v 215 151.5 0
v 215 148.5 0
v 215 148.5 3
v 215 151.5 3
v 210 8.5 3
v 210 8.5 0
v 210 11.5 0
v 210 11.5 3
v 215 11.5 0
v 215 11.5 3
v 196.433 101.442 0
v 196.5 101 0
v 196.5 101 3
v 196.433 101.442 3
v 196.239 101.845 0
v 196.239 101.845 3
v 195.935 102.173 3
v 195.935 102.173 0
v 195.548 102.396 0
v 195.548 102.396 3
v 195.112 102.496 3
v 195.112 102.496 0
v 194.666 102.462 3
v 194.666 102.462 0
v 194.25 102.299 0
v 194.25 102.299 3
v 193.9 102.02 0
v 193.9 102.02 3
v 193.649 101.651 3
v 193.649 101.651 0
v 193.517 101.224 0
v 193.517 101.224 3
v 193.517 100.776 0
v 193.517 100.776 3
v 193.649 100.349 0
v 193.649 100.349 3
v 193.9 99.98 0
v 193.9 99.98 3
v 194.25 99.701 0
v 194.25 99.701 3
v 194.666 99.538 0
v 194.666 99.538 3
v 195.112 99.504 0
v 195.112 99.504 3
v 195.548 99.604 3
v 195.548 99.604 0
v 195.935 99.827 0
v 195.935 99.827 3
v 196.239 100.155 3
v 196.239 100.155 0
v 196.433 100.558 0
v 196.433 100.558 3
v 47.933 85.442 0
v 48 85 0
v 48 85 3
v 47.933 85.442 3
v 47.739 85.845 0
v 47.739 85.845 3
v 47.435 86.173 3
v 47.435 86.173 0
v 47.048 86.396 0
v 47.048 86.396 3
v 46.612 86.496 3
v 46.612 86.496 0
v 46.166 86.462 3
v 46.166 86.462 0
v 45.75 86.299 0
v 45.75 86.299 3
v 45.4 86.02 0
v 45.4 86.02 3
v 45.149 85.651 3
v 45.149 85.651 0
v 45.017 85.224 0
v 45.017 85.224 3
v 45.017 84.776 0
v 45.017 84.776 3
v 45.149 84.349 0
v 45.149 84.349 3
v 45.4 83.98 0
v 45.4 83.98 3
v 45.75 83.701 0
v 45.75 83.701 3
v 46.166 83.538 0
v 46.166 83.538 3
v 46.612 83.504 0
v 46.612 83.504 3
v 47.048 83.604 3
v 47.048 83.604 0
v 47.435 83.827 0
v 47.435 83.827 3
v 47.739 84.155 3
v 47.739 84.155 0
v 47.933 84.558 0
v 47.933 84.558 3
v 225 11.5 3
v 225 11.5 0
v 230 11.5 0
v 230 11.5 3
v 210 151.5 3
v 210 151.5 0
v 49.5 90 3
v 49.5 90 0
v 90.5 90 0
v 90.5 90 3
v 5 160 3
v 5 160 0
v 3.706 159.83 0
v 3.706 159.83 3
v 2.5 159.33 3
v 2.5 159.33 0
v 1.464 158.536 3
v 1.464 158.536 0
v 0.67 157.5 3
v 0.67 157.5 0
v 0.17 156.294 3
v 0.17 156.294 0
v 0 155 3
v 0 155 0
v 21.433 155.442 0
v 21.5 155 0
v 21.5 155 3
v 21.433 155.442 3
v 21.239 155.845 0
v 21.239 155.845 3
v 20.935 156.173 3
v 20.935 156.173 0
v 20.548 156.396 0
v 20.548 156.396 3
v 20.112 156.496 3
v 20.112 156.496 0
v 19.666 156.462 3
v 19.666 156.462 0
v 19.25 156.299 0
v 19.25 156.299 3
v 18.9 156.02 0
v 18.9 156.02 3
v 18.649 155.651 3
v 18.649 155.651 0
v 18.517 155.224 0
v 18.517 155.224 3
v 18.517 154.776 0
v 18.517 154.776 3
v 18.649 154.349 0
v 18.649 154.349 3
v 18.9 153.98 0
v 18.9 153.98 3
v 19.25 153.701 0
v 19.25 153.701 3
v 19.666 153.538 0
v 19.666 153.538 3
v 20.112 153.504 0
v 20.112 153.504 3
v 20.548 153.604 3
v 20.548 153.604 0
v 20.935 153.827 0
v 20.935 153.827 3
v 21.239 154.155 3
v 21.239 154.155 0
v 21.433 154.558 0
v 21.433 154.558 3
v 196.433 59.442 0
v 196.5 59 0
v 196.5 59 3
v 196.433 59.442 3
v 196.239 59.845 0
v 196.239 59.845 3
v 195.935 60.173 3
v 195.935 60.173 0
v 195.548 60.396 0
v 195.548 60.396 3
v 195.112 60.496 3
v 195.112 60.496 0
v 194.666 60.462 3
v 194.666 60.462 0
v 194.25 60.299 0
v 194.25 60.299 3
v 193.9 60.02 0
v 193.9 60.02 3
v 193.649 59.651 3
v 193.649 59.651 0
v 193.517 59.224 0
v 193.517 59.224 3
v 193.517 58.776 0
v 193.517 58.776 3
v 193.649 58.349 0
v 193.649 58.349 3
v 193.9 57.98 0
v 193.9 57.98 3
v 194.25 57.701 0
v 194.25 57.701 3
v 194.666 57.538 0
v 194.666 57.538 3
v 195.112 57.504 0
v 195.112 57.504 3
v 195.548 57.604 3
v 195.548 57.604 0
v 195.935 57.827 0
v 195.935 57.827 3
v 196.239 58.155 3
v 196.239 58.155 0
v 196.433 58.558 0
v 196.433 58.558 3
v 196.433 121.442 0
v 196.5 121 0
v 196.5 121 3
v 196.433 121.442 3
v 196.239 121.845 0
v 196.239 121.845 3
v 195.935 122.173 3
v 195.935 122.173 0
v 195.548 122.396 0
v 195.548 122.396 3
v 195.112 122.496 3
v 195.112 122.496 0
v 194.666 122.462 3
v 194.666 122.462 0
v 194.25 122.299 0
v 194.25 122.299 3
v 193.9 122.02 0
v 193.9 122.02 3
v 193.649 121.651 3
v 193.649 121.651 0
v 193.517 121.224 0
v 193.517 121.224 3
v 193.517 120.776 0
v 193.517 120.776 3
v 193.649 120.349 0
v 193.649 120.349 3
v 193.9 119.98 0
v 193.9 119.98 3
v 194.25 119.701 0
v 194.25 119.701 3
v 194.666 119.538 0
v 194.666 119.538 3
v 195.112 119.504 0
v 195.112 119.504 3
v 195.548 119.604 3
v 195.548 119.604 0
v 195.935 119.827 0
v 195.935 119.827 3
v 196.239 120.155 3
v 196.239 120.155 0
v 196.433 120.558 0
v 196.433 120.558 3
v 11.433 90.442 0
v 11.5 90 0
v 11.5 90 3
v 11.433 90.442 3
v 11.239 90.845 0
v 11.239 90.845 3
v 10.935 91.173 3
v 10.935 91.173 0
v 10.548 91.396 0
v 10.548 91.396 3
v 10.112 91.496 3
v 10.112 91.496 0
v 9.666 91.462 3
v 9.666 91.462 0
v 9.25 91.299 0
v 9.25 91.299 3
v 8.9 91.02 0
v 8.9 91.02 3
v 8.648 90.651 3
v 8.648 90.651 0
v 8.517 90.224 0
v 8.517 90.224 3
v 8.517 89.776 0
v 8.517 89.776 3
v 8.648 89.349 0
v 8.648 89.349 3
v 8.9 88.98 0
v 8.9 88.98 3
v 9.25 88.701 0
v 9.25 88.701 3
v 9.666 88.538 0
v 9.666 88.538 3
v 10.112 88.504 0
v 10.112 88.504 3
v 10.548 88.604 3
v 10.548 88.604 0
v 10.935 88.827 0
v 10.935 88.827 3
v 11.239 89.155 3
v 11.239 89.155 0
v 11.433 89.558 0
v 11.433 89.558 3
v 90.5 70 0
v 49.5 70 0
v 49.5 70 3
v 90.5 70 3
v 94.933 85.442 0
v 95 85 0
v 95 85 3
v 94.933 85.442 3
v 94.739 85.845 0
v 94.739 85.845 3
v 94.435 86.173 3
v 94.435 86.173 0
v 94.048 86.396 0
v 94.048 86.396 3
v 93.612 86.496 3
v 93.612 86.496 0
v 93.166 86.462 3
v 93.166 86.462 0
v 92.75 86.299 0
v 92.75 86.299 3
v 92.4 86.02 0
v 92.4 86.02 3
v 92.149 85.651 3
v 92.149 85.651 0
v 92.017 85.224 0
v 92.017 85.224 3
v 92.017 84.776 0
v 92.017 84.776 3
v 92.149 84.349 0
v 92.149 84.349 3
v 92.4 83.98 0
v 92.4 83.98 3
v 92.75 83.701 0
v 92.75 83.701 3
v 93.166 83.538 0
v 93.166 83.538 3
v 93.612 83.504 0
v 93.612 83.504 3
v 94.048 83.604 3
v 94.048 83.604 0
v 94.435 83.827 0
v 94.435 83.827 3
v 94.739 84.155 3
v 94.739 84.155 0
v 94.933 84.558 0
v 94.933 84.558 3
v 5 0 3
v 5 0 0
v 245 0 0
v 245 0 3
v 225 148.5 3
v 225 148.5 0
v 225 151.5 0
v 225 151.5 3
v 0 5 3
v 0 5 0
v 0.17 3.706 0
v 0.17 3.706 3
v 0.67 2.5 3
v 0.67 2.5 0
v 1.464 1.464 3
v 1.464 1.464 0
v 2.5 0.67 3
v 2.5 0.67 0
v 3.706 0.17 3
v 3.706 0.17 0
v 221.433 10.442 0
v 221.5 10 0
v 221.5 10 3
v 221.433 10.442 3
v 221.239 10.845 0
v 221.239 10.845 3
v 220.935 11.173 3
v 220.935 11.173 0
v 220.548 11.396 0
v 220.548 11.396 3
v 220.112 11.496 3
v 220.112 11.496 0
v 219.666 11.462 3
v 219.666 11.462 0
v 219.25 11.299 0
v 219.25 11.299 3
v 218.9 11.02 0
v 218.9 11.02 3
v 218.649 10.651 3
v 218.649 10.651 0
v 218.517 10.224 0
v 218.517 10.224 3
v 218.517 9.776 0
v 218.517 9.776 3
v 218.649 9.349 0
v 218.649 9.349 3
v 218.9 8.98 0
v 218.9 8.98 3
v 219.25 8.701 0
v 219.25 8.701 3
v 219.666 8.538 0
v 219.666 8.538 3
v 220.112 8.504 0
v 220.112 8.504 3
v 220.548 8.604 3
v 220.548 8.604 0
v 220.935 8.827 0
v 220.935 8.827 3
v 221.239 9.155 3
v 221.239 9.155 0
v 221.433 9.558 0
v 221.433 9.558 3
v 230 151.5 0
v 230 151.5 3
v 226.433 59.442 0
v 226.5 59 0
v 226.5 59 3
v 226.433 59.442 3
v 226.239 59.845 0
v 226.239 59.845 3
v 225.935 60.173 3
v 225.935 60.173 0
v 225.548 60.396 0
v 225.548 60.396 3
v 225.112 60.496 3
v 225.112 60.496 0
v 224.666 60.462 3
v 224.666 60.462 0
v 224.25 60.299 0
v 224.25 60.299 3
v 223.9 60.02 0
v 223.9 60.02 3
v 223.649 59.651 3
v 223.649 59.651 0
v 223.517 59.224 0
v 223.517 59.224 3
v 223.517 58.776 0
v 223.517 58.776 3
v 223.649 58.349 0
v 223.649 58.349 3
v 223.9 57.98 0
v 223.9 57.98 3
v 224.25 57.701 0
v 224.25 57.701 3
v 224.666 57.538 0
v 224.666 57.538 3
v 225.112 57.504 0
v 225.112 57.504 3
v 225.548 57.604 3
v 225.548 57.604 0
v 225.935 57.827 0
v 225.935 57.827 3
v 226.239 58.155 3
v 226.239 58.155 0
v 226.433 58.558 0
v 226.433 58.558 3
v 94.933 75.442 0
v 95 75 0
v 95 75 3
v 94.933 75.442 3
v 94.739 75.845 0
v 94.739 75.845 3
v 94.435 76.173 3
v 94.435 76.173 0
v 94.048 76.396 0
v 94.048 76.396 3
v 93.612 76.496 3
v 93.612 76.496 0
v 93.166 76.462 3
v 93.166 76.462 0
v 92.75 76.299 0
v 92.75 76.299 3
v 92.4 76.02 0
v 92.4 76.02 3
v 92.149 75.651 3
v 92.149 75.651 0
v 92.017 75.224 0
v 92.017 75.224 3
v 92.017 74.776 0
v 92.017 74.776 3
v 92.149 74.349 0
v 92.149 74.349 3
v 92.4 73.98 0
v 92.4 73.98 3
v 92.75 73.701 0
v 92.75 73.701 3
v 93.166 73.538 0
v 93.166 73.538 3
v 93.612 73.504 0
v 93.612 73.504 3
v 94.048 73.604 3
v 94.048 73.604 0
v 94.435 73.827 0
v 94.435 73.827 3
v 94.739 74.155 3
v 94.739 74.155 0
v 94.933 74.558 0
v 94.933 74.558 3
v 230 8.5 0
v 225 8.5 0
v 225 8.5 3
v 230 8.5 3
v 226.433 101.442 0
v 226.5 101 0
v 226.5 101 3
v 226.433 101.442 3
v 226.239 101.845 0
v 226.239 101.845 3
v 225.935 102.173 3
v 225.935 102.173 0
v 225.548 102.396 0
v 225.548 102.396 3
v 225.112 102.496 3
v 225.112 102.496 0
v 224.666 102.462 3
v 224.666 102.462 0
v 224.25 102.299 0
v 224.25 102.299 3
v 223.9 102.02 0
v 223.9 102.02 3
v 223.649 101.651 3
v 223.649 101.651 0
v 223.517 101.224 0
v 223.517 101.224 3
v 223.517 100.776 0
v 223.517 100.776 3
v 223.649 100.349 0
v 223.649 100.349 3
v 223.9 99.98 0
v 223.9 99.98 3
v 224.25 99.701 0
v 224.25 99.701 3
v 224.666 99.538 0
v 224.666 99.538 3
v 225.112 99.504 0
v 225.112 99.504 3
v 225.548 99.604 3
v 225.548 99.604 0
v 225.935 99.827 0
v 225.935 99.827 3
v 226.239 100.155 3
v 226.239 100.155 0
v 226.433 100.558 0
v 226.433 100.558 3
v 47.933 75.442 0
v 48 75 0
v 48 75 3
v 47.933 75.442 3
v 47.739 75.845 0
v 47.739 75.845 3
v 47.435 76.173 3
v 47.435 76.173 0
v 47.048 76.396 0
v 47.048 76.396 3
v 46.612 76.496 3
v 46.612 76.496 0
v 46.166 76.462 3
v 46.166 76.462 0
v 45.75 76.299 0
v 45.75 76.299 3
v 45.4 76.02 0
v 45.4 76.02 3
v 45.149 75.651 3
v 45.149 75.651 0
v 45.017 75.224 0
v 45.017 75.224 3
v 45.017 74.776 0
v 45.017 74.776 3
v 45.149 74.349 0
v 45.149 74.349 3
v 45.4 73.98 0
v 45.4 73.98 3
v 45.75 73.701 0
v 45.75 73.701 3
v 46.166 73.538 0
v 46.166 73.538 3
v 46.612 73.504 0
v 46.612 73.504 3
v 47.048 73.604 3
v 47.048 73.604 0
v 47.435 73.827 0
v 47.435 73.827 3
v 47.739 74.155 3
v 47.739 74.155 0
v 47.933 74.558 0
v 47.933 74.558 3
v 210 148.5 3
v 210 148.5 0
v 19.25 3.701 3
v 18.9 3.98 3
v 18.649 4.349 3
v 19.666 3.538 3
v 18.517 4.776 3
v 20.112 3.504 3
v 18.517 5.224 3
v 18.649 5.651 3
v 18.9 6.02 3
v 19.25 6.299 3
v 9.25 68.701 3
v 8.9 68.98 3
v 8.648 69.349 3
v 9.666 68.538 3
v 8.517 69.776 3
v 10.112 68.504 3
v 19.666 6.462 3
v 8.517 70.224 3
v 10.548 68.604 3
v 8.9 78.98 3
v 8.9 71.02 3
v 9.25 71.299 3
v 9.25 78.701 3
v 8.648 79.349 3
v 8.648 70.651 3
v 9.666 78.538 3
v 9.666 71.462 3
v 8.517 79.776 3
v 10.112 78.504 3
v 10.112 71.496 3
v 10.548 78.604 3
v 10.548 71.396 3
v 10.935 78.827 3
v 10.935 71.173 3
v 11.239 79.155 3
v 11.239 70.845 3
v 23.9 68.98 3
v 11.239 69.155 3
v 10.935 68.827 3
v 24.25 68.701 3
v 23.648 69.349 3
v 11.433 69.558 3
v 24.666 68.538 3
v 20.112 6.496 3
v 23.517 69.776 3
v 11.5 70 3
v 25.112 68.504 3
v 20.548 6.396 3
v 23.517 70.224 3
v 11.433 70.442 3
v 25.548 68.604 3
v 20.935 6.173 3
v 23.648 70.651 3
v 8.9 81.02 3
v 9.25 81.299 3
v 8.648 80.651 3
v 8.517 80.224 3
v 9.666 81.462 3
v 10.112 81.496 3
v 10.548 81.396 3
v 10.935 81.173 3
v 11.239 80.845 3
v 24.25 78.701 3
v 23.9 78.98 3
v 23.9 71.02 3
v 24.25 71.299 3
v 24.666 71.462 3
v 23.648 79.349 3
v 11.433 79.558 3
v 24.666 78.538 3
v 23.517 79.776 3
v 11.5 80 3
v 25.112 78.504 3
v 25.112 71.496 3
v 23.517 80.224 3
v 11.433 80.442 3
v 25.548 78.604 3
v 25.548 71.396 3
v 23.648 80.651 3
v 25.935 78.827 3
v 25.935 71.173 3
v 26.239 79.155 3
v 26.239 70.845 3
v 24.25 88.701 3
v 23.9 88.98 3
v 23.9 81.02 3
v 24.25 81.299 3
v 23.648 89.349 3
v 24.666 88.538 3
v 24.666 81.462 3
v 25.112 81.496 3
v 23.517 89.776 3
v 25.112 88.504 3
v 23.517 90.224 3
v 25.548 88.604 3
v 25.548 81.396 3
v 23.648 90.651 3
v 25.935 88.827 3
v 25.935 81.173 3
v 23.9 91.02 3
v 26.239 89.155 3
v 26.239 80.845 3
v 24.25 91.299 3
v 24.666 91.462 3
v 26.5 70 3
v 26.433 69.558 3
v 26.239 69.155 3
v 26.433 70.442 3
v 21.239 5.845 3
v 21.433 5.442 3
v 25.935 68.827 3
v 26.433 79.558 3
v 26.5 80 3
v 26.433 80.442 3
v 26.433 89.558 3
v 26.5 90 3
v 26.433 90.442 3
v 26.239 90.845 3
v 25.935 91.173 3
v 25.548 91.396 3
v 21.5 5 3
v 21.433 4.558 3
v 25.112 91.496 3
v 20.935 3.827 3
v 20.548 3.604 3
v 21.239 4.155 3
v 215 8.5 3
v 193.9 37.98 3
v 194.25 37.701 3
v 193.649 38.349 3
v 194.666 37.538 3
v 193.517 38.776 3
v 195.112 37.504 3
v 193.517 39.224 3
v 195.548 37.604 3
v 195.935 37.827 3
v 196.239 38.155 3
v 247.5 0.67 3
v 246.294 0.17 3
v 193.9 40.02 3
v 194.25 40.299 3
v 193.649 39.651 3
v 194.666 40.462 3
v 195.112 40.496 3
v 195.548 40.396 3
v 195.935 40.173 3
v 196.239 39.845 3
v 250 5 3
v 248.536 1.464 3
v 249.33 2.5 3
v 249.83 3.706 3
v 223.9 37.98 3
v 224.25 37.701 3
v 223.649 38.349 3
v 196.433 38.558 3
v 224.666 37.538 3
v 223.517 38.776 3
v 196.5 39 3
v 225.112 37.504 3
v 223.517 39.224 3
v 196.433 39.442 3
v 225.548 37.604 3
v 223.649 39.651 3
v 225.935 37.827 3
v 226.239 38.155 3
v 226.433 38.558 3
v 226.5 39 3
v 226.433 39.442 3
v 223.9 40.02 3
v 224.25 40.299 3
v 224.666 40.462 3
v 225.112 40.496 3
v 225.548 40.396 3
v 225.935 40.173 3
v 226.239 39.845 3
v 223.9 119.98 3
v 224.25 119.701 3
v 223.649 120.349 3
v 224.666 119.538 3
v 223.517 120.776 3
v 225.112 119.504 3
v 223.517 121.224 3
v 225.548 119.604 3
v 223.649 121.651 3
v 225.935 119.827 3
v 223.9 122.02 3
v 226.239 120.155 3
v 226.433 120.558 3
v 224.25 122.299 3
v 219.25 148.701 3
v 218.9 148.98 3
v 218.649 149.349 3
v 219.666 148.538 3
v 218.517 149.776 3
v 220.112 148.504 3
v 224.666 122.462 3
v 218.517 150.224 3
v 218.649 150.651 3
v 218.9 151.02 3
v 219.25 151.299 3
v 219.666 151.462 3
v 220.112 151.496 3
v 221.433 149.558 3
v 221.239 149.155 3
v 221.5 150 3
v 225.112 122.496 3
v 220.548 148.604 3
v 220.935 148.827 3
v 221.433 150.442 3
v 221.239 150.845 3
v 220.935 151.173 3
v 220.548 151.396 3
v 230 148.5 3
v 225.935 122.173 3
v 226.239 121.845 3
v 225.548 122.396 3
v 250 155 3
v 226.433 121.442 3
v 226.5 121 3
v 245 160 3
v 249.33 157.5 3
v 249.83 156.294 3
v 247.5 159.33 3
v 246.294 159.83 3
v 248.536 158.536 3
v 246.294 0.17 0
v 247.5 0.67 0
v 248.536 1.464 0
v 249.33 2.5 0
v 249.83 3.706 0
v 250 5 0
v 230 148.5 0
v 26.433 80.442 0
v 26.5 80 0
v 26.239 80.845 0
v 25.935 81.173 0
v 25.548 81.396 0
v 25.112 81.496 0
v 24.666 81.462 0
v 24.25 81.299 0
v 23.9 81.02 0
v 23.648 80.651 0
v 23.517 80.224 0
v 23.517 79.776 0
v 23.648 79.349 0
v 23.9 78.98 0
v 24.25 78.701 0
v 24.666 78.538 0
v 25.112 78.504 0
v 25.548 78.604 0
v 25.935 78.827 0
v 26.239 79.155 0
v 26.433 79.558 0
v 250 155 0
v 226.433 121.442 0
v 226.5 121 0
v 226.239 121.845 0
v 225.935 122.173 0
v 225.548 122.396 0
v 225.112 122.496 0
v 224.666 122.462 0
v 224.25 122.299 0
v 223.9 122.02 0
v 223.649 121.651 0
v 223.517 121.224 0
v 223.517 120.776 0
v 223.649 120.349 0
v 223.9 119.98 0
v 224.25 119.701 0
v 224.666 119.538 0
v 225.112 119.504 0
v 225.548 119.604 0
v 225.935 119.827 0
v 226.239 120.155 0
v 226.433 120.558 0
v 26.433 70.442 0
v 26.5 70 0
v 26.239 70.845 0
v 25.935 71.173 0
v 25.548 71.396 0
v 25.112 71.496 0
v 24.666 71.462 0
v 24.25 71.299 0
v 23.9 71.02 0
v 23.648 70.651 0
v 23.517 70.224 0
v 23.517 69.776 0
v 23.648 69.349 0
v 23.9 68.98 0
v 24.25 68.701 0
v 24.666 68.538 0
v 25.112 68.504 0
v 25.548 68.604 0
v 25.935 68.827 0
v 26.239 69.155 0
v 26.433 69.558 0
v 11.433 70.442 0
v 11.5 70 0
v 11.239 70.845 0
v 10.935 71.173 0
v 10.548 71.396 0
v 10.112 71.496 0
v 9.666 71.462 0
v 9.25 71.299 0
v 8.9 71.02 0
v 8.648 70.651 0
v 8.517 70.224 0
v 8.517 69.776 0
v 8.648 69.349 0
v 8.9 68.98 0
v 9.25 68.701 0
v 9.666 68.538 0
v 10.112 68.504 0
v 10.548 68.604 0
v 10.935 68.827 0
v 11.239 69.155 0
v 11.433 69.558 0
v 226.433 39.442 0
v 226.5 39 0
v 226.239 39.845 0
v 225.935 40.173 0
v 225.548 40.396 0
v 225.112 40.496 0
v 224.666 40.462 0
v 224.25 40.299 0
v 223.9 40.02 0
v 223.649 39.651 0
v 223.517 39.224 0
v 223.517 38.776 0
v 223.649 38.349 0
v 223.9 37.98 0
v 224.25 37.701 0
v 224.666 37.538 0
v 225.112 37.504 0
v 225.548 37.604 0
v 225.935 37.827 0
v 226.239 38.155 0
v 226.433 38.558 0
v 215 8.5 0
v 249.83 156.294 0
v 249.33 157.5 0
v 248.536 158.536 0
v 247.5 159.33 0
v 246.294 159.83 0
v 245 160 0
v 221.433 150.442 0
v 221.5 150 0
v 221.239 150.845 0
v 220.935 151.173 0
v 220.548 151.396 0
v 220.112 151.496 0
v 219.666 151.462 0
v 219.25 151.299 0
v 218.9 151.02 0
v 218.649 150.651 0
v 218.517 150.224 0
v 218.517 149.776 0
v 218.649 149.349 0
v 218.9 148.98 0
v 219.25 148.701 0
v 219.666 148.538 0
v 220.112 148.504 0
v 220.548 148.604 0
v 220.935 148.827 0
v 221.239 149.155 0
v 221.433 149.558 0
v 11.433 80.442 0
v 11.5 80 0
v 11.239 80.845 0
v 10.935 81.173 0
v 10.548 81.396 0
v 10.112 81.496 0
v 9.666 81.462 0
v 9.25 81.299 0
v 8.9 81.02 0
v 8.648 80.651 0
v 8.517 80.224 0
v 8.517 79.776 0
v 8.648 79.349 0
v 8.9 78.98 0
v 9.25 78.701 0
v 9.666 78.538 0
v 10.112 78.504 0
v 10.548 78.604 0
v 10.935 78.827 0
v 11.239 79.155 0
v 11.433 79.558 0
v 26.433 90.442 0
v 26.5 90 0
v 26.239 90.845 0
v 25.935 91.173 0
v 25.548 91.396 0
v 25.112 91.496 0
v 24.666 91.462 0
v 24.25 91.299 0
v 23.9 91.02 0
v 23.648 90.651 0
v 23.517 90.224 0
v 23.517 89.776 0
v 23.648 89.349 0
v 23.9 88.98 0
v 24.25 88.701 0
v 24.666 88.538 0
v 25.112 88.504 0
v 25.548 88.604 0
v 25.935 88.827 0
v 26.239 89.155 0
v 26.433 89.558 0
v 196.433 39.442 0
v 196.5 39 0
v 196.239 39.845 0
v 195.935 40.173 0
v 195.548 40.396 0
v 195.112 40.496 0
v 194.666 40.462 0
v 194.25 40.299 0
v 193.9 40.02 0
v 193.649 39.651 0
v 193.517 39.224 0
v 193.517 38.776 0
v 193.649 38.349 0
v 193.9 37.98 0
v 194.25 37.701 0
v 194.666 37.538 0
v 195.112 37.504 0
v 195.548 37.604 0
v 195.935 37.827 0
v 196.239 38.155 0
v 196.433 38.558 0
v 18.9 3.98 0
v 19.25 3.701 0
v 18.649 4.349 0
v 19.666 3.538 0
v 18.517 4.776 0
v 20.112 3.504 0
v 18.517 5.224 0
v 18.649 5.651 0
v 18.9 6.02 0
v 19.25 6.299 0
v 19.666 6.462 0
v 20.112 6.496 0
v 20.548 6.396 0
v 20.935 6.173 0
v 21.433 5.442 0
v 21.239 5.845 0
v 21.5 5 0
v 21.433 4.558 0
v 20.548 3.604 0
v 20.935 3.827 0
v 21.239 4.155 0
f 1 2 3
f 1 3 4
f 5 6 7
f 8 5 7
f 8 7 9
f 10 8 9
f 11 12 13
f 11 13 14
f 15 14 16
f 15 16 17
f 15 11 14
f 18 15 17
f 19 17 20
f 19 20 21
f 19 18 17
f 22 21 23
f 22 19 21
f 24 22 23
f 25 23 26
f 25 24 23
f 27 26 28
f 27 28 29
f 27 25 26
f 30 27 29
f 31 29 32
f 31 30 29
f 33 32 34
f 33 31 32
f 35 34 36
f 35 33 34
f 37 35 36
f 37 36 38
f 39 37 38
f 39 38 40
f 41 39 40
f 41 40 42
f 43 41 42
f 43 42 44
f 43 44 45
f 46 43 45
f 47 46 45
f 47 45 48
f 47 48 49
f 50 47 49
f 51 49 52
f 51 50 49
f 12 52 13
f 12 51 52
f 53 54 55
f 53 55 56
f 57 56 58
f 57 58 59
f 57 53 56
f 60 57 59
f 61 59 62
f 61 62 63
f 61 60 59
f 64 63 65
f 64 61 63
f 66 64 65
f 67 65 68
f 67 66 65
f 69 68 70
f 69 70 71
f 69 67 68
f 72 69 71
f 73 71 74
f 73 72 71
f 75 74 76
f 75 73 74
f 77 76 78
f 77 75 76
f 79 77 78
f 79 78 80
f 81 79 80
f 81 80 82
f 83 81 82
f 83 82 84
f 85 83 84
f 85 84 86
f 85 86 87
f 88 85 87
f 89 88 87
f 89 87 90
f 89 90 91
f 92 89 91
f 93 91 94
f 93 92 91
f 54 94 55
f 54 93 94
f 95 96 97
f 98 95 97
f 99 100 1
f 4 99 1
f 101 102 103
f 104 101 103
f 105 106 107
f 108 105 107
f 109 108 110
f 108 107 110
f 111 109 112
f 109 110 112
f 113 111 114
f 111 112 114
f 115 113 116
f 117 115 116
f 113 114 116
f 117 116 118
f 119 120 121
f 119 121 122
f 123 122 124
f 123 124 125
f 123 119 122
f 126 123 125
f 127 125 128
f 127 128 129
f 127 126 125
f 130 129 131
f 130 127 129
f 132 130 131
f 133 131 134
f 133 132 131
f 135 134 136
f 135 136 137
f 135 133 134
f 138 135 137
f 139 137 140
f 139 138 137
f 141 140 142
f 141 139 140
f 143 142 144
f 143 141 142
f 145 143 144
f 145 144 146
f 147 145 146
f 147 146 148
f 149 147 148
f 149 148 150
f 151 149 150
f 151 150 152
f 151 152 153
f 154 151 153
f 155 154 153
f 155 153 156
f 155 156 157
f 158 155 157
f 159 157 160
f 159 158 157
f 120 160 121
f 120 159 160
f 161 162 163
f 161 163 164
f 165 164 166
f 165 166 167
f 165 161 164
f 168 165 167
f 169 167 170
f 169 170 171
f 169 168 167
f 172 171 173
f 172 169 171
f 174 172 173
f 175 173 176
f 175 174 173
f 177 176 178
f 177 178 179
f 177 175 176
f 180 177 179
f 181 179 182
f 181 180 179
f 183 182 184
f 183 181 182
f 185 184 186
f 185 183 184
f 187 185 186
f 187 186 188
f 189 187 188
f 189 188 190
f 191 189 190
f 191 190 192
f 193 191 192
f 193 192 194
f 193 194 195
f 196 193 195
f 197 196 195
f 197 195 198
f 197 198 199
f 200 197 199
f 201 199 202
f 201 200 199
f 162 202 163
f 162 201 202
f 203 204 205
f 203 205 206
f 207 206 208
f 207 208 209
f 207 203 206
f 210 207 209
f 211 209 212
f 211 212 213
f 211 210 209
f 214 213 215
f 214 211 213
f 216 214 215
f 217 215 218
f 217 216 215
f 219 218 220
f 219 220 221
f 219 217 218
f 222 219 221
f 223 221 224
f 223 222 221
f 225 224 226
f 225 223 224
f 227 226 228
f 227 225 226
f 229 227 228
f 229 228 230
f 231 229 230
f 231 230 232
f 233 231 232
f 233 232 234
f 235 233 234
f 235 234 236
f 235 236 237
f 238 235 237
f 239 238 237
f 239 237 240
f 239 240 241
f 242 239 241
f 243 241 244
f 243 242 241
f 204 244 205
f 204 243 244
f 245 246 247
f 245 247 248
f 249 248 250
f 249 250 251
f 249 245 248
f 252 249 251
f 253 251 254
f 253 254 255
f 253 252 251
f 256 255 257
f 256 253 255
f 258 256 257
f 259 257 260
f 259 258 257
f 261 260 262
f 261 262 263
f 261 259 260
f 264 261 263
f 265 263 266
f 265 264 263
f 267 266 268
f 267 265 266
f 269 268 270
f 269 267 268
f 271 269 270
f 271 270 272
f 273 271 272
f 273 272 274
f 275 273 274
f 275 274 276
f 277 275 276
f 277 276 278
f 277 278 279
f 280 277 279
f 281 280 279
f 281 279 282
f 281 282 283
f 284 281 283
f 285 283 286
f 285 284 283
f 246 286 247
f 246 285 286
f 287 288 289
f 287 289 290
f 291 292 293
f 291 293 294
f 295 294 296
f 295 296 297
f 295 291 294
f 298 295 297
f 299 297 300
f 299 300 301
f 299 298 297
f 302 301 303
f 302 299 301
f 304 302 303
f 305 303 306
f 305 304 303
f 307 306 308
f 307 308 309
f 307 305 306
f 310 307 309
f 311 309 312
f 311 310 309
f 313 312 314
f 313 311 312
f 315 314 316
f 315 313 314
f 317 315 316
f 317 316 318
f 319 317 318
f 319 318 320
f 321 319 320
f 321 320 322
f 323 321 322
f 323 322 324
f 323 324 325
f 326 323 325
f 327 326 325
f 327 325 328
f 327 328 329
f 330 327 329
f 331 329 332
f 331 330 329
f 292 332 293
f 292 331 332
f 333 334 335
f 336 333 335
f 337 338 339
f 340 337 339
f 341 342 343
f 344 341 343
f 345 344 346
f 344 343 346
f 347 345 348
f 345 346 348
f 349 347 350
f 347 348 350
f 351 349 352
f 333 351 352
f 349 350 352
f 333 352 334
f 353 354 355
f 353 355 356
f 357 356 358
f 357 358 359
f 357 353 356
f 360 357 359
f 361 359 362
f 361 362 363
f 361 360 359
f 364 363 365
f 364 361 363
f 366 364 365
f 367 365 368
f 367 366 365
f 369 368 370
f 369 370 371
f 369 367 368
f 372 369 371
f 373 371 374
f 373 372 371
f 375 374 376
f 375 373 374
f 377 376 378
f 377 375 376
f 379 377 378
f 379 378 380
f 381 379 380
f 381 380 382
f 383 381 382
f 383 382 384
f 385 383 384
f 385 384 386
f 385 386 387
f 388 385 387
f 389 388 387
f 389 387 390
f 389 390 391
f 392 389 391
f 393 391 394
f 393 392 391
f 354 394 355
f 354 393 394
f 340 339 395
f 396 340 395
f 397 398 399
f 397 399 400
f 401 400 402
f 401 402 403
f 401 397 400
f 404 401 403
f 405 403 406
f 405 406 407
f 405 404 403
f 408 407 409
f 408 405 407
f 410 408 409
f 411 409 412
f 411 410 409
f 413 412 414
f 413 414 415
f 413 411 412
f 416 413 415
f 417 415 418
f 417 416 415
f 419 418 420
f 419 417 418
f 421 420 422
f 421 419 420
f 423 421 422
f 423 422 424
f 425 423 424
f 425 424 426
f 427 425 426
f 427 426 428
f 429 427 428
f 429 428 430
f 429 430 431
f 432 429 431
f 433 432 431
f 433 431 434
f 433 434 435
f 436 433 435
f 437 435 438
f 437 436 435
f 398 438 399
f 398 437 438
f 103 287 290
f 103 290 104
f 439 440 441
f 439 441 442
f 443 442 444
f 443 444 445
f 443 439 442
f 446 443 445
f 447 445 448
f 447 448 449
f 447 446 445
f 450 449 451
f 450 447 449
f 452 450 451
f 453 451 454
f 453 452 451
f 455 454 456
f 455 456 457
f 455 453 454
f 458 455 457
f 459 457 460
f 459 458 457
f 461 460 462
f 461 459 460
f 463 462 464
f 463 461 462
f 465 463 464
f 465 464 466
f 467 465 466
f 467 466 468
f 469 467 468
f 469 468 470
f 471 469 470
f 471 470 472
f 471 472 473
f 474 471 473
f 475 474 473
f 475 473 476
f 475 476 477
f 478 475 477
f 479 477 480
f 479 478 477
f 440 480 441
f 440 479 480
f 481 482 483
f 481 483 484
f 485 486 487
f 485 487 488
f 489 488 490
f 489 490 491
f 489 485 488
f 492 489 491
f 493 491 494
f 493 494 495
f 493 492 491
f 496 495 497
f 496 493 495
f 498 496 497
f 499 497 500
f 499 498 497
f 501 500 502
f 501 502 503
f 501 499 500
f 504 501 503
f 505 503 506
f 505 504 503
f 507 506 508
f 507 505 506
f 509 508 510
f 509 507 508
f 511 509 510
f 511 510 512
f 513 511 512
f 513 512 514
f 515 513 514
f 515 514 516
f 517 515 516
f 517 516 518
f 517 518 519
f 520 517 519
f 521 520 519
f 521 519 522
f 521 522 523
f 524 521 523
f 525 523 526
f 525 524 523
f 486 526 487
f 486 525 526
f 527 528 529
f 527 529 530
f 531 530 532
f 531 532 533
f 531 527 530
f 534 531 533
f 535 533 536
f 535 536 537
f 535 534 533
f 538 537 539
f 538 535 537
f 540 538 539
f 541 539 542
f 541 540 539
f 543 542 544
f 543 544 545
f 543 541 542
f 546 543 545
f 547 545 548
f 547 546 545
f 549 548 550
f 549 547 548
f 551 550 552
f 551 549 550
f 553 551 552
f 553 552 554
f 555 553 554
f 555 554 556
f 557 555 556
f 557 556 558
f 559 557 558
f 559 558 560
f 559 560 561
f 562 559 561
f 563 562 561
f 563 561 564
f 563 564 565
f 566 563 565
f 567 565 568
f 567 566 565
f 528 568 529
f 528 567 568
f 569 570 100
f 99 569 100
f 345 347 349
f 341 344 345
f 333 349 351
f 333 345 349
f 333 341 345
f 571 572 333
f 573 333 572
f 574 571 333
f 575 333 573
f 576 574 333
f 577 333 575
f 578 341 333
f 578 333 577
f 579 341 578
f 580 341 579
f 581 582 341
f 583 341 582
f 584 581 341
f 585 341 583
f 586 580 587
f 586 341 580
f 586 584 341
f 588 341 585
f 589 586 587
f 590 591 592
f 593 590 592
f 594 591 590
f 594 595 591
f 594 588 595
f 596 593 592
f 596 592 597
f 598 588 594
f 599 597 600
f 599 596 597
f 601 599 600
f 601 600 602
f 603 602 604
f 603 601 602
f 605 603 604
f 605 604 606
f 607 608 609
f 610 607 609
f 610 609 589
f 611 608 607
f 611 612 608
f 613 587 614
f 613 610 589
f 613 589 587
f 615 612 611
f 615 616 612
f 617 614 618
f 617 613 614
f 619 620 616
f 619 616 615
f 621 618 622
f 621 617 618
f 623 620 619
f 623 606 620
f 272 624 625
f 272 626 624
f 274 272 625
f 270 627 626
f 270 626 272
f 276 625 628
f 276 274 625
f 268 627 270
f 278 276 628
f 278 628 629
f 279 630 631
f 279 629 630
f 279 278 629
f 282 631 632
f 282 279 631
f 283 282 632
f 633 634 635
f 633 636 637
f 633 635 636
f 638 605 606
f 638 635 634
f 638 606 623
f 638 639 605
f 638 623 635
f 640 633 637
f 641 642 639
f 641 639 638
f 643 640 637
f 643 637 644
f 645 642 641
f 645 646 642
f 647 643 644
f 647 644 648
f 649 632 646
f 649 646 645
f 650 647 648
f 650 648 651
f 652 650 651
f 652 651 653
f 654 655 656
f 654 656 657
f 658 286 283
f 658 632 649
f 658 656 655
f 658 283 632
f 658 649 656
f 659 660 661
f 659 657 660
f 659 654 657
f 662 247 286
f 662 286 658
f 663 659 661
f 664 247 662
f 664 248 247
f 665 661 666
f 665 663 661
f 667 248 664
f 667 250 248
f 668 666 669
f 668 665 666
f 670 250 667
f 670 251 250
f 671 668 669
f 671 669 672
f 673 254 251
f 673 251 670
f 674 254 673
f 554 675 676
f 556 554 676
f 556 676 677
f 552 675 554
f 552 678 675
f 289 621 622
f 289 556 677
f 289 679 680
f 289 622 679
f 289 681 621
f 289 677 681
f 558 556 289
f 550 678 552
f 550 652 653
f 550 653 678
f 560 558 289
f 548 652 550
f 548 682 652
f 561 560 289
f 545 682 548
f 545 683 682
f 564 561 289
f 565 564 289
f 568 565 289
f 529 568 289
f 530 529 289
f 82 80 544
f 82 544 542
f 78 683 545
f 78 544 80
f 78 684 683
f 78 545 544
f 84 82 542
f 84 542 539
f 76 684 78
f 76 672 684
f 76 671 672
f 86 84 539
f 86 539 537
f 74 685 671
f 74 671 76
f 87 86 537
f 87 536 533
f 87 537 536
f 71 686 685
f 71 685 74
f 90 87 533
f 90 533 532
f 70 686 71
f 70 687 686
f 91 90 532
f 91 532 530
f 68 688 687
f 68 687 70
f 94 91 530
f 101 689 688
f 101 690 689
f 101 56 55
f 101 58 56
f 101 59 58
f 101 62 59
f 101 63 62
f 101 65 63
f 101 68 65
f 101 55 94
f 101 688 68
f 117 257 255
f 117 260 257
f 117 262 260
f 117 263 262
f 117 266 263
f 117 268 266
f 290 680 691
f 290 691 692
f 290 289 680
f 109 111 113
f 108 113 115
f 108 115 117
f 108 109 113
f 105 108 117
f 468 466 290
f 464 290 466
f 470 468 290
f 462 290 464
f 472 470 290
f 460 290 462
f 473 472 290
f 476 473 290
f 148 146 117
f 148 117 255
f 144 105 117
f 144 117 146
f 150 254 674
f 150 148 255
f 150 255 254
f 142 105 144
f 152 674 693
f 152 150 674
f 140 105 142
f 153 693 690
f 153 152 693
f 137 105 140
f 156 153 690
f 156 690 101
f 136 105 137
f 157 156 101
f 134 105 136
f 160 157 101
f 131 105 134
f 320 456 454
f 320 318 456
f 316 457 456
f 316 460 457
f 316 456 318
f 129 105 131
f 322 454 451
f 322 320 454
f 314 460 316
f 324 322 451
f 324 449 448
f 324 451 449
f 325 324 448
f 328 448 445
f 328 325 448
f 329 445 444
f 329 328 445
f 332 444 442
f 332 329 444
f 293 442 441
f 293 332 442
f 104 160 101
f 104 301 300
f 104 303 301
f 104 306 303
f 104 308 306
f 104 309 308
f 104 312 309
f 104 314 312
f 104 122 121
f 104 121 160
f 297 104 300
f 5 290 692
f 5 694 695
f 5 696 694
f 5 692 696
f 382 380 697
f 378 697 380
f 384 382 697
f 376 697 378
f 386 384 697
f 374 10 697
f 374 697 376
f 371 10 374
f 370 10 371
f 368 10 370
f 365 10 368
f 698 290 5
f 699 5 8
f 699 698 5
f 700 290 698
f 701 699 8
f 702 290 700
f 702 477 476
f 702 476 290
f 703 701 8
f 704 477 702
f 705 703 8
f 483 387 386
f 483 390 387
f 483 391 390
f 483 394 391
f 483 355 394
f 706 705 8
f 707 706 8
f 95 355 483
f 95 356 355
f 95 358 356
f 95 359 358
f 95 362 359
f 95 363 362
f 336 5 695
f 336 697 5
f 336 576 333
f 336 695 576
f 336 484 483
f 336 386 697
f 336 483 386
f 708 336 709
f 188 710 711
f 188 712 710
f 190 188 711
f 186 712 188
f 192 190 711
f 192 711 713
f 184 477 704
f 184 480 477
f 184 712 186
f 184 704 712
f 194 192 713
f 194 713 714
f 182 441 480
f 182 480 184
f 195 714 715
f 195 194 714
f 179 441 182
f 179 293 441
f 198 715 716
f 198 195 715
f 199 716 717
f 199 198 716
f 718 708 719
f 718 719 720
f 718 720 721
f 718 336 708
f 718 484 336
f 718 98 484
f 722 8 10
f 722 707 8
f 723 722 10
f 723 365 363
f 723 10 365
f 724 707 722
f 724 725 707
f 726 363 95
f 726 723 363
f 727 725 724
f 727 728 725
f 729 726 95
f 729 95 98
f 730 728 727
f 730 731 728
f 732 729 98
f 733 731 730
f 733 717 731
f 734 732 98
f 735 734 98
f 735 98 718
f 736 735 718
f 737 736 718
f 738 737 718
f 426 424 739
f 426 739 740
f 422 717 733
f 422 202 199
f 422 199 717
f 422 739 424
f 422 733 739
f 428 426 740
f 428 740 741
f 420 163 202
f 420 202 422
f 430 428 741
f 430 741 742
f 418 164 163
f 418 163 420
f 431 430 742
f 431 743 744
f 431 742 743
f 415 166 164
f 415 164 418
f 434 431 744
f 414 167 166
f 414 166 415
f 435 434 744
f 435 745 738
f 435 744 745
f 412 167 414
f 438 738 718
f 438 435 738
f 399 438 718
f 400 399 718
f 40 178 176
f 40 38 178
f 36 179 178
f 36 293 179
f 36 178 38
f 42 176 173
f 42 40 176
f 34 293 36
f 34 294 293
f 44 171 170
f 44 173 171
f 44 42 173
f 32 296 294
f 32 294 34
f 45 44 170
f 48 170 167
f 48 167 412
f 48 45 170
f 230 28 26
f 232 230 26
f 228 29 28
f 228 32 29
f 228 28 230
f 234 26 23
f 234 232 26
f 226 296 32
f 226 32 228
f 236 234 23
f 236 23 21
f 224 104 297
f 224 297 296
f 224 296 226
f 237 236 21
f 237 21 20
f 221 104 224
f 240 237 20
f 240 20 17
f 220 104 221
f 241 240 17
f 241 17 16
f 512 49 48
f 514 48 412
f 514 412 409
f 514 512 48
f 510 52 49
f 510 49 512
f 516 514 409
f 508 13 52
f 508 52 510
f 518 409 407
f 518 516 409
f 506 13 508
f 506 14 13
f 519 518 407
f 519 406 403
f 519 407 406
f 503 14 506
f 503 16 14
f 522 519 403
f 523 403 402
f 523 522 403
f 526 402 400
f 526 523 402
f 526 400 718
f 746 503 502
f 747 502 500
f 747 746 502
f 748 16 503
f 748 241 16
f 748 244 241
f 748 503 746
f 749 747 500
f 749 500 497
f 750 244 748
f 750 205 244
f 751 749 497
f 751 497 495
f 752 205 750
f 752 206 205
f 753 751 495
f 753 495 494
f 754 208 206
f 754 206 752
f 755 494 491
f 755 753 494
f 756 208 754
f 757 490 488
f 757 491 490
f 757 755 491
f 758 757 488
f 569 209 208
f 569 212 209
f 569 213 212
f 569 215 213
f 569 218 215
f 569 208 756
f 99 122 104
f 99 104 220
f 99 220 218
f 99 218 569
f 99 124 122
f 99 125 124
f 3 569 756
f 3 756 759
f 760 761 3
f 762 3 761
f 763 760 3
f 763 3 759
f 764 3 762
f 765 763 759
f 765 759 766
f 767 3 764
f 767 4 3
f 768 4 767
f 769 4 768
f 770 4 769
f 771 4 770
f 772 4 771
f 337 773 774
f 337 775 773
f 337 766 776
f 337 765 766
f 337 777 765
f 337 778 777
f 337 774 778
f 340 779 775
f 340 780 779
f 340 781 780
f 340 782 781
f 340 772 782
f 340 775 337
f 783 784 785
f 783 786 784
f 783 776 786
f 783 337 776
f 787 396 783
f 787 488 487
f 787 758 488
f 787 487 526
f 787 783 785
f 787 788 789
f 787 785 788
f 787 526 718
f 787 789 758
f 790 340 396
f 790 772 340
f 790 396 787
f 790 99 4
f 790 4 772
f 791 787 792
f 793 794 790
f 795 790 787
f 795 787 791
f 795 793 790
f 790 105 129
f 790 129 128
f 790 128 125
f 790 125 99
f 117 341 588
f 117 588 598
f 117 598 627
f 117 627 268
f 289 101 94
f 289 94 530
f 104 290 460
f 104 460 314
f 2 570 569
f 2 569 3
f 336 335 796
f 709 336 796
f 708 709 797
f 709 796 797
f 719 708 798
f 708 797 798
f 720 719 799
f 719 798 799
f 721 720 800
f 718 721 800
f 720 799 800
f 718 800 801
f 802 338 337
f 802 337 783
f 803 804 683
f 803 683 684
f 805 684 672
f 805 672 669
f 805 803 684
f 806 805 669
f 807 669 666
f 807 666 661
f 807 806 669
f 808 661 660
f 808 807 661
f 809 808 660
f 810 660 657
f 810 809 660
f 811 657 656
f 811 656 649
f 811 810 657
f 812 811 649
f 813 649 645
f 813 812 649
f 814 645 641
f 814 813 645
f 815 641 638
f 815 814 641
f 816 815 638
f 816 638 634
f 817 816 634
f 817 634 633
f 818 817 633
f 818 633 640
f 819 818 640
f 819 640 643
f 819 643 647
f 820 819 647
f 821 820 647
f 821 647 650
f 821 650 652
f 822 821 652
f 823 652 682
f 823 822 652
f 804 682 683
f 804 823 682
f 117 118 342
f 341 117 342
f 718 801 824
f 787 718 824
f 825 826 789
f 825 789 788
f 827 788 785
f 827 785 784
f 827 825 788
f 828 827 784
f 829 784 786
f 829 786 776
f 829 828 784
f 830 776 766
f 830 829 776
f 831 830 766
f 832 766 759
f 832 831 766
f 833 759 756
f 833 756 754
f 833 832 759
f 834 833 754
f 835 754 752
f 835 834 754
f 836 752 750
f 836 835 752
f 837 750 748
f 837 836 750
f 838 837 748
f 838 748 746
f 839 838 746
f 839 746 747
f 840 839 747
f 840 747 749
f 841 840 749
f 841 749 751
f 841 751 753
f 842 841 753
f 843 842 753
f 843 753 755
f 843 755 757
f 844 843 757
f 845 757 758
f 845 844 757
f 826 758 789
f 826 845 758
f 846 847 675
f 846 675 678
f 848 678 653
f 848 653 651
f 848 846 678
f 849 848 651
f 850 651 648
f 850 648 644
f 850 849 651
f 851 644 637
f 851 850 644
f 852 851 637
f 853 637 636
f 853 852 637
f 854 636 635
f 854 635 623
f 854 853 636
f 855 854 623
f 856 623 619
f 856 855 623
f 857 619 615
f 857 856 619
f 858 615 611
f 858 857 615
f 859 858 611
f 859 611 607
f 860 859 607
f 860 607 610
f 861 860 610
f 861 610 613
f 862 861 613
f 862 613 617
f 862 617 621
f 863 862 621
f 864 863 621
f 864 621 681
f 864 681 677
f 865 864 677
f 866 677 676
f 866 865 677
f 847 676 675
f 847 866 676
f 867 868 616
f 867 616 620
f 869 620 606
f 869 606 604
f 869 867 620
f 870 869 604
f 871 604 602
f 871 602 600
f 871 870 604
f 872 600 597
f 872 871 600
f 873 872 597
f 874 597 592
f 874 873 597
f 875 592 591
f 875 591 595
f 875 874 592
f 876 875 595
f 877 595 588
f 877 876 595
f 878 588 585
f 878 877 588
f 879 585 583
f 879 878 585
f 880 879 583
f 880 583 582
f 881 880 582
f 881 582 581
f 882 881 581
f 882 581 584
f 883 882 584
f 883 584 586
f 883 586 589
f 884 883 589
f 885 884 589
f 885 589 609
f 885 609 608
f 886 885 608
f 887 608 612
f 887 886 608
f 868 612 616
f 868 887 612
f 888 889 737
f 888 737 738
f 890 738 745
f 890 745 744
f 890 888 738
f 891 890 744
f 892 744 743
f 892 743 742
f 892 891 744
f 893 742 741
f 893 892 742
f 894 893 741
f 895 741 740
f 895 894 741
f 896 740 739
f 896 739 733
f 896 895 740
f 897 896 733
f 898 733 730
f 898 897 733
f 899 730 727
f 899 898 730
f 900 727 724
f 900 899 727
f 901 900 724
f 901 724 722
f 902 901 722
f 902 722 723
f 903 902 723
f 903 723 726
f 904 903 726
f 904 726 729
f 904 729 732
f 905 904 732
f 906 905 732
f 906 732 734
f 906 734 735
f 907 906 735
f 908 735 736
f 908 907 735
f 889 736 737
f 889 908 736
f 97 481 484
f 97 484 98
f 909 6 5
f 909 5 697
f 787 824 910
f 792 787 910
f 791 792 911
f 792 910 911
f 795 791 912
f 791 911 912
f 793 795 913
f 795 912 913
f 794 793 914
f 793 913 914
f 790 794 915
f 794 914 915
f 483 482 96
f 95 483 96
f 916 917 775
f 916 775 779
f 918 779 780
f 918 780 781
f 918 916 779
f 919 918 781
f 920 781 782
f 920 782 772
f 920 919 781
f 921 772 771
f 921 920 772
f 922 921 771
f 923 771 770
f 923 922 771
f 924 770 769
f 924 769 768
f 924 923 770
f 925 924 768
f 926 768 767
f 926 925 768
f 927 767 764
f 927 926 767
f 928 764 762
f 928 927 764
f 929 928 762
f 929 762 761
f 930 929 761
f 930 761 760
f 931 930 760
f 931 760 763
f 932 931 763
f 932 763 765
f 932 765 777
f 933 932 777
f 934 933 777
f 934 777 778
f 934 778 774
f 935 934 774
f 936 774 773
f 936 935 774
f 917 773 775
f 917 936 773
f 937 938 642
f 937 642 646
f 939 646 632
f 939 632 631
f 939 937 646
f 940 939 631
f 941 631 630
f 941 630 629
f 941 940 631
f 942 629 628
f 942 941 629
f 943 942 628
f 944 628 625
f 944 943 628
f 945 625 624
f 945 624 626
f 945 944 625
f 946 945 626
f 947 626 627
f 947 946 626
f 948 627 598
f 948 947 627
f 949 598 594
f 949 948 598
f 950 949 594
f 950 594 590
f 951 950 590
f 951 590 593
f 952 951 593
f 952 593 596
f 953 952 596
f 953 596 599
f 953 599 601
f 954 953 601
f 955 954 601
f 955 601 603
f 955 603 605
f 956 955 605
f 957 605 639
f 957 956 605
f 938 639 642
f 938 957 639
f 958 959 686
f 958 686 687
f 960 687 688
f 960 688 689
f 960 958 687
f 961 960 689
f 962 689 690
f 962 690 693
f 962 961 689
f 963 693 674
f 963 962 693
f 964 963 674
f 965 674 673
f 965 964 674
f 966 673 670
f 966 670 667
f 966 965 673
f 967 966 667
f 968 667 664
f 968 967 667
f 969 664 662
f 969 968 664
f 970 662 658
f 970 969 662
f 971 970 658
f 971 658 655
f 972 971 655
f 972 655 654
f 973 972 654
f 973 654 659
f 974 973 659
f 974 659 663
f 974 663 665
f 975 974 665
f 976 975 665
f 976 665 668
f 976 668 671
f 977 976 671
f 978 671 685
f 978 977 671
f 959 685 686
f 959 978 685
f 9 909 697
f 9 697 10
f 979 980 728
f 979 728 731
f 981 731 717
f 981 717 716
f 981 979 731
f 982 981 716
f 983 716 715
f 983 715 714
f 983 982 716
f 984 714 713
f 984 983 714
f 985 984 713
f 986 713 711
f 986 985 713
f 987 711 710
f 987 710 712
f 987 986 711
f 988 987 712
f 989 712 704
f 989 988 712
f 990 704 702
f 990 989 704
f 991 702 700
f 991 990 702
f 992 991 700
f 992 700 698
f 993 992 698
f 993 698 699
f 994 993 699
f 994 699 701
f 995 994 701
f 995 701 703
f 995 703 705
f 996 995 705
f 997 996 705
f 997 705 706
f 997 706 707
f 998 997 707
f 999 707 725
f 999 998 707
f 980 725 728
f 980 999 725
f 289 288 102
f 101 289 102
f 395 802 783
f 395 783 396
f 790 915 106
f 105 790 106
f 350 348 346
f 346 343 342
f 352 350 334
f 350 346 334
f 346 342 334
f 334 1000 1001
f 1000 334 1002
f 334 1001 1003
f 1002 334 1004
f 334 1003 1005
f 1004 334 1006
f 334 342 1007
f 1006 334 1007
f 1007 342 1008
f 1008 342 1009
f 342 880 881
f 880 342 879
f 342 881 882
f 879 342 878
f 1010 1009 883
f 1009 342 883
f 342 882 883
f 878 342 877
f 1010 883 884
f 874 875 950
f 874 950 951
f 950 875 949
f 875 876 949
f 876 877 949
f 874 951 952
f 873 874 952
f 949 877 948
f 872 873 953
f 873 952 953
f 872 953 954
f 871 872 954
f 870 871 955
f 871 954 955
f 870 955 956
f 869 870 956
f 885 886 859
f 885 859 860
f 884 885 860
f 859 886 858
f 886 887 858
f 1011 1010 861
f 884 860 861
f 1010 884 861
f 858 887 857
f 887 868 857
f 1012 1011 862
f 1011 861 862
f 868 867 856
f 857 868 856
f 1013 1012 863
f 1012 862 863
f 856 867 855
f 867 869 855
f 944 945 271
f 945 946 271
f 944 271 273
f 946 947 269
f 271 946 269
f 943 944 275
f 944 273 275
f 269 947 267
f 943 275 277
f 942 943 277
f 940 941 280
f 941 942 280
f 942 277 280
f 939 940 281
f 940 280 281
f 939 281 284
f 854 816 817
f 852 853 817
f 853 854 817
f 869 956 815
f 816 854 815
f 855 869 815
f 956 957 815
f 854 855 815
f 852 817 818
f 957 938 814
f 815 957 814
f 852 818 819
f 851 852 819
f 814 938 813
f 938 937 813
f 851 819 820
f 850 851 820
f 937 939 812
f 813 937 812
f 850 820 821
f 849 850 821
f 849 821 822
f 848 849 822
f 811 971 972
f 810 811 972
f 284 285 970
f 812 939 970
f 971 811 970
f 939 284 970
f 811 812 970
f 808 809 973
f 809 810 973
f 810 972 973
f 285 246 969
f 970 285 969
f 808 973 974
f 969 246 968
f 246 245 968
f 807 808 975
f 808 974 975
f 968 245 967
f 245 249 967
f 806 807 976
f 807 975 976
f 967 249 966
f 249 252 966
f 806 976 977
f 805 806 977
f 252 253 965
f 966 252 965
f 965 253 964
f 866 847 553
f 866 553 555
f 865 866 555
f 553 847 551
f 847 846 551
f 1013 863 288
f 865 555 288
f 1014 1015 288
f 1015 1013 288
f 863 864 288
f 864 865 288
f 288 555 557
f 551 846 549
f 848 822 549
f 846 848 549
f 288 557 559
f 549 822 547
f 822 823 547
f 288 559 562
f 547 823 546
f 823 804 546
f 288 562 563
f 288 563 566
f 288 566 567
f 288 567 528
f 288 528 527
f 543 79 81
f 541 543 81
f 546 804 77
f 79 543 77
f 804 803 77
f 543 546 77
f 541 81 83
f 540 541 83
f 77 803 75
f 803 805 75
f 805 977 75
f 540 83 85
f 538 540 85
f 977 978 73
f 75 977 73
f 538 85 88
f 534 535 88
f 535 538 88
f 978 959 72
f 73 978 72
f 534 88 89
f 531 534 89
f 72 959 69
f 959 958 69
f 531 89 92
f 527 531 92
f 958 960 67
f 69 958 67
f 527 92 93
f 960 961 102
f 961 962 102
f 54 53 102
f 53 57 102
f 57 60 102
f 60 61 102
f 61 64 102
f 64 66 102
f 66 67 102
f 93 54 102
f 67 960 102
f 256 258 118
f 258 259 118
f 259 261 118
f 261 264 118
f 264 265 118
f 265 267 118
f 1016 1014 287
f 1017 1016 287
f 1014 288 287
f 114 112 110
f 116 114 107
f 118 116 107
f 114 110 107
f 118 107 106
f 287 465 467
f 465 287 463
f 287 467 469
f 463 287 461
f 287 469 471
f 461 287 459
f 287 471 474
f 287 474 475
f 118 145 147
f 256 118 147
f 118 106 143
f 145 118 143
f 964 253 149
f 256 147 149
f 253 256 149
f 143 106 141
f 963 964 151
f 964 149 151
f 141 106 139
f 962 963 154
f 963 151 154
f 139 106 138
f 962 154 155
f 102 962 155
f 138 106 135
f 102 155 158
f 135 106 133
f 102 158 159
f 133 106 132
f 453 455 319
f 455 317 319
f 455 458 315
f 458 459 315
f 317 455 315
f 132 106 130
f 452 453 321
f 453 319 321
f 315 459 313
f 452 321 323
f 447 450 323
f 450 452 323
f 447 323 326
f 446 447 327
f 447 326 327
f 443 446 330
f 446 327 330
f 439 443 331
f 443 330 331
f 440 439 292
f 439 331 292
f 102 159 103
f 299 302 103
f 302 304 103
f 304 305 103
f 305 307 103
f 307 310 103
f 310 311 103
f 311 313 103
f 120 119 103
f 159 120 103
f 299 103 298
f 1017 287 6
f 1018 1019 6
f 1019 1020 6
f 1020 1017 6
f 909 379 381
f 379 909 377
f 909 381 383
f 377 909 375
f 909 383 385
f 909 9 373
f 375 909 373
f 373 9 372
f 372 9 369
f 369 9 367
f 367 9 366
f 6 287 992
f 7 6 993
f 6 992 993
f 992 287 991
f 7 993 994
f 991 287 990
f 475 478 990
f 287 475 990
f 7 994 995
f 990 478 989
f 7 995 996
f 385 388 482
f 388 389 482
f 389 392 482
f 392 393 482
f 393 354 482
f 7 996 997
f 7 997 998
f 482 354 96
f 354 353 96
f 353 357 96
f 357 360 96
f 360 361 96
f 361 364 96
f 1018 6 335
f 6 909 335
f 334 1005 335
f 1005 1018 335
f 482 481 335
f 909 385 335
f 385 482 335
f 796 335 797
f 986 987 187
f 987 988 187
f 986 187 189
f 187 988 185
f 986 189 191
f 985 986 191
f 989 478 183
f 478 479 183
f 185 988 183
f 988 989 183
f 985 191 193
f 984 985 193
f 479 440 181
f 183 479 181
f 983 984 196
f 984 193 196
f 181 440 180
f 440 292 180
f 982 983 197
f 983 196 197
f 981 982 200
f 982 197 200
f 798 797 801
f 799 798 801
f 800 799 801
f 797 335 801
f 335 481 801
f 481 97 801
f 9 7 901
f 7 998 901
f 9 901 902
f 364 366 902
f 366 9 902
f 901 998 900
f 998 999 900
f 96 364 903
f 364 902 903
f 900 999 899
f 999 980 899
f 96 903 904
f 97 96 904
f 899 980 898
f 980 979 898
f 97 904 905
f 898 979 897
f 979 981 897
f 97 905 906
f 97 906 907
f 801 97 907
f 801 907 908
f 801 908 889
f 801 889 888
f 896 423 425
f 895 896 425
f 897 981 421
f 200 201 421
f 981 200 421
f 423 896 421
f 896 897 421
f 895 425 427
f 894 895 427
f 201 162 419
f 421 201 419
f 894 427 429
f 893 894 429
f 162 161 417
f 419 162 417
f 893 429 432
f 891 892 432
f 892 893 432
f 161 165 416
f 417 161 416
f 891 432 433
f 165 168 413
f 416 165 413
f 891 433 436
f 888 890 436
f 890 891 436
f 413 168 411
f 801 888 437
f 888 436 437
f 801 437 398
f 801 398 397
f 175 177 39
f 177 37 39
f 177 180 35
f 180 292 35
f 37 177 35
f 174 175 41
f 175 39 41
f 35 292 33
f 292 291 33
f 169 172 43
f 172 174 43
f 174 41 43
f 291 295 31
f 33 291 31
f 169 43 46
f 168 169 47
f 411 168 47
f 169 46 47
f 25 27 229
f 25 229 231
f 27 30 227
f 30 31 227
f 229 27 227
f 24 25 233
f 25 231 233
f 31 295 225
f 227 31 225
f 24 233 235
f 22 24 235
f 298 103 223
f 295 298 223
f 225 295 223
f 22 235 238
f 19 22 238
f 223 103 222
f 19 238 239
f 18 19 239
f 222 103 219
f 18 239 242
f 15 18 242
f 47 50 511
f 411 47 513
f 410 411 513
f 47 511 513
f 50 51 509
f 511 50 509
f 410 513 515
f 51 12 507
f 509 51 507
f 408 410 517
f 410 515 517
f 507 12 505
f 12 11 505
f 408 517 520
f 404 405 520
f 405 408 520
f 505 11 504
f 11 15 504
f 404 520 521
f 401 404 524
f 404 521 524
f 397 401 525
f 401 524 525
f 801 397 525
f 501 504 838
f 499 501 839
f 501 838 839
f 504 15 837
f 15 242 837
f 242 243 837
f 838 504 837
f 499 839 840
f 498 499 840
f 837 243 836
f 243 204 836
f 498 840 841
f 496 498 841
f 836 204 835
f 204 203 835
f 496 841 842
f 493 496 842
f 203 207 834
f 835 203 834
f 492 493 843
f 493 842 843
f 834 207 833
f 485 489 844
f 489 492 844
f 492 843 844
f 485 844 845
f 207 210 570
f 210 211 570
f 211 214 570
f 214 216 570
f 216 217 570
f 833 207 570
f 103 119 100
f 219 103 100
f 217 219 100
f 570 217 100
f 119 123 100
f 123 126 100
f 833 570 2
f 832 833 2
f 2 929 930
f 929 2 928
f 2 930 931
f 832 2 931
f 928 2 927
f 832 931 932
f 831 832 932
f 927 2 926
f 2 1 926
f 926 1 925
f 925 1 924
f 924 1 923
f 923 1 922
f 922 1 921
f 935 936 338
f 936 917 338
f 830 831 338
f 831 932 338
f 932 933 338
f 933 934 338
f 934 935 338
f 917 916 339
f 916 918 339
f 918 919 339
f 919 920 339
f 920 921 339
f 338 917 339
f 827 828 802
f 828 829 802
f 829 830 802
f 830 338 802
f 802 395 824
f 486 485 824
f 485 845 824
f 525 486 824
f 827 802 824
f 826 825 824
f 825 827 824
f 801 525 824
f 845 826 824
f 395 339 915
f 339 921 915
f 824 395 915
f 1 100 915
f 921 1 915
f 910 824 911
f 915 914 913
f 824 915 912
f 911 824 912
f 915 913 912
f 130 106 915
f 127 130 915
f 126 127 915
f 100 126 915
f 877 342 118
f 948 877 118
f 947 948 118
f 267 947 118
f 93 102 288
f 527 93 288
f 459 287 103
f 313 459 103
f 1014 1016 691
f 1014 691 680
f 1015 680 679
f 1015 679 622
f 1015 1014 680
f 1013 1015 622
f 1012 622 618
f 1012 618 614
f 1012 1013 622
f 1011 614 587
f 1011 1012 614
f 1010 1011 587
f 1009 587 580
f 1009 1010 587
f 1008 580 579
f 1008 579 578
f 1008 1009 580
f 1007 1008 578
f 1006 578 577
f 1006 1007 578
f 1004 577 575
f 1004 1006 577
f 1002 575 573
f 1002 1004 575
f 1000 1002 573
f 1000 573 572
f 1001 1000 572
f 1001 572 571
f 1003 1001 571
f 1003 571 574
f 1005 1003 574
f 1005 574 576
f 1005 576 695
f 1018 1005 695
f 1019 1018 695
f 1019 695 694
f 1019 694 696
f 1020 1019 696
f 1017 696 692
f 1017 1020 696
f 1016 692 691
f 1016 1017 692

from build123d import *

# Parameters (mm, degrees)
F0_R     = 1.5
F0_W     = 5
F0_H     = 3
F0_W_2   = 41
F0_H_2   = 20
F1_DEPTH = 3


with BuildPart() as f1:
    # F0 (on Top) → F1 (new body)
    with BuildSketch(Plane.XY):
        with BuildLine():
            Line((245, 160), (5, 160))
            ThreePointArc((5, 160), (1.4644660941, 158.5355339059), (0, 155))
            Line((0, 155), (0, 5))
            ThreePointArc((0, 5), (1.4644660941, 1.4644660941), (5, 0))
            Line((5, 0), (245, 0))
            ThreePointArc((245, 0), (248.5355339059, 1.4644660941), (250, 5))
            Line((250, 5), (250, 155))
            ThreePointArc((250, 155), (248.5355339059, 158.5355339059), (245, 160))
        make_face()
        with Locations((20, 5)):
            Circle(F0_R, mode=Mode.SUBTRACT)
        with Locations((212.5, 10)):
            Rectangle(F0_W, F0_H, mode=Mode.SUBTRACT)
        with Locations((220, 10)):
            Circle(F0_R, mode=Mode.SUBTRACT)
        with Locations((227.5, 10)):
            Rectangle(F0_W, F0_H, mode=Mode.SUBTRACT)
        with Locations((195, 39)):
            Circle(F0_R, mode=Mode.SUBTRACT)
        with Locations((225, 39)):
            Circle(F0_R, mode=Mode.SUBTRACT)
        with Locations((9.9999278665, 70)):
            Circle(F0_R, mode=Mode.SUBTRACT)
        with Locations((24.9999278665, 70)):
            Circle(F0_R, mode=Mode.SUBTRACT)
        with Locations((9.9999278665, 80)):
            Circle(F0_R, mode=Mode.SUBTRACT)
        with Locations((24.9999278665, 80)):
            Circle(F0_R, mode=Mode.SUBTRACT)
        with Locations((9.9999278665, 90)):
            Circle(F0_R, mode=Mode.SUBTRACT)
        with Locations((24.9999278665, 90)):
            Circle(F0_R, mode=Mode.SUBTRACT)
        with Locations((46.5, 75)):
            Circle(F0_R, mode=Mode.SUBTRACT)
        with Locations((46.5, 85)):
            Circle(F0_R, mode=Mode.SUBTRACT)
        with Locations((70, 80)):
            Rectangle(F0_W_2, F0_H_2, mode=Mode.SUBTRACT)
        with Locations((93.5, 75)):
            Circle(F0_R, mode=Mode.SUBTRACT)
        with Locations((93.5, 85)):
            Circle(F0_R, mode=Mode.SUBTRACT)
        with Locations((20, 155)):
            Circle(F0_R, mode=Mode.SUBTRACT)
        with Locations((195, 59)):
            Circle(F0_R, mode=Mode.SUBTRACT)
        with Locations((225, 59)):
            Circle(F0_R, mode=Mode.SUBTRACT)
        with Locations((195, 101)):
            Circle(F0_R, mode=Mode.SUBTRACT)
        with Locations((195, 121)):
            Circle(F0_R, mode=Mode.SUBTRACT)
        with Locations((225, 101)):
            Circle(F0_R, mode=Mode.SUBTRACT)
        with Locations((225, 121)):
            Circle(F0_R, mode=Mode.SUBTRACT)
        with Locations((212.5, 150)):
            Rectangle(F0_W, F0_H, mode=Mode.SUBTRACT)
        with Locations((220, 150)):
            Circle(F0_R, mode=Mode.SUBTRACT)
        with Locations((227.5, 150)):
            Rectangle(F0_W, F0_H, mode=Mode.SUBTRACT)
    extrude(amount=F1_DEPTH)


solid = f1.part
